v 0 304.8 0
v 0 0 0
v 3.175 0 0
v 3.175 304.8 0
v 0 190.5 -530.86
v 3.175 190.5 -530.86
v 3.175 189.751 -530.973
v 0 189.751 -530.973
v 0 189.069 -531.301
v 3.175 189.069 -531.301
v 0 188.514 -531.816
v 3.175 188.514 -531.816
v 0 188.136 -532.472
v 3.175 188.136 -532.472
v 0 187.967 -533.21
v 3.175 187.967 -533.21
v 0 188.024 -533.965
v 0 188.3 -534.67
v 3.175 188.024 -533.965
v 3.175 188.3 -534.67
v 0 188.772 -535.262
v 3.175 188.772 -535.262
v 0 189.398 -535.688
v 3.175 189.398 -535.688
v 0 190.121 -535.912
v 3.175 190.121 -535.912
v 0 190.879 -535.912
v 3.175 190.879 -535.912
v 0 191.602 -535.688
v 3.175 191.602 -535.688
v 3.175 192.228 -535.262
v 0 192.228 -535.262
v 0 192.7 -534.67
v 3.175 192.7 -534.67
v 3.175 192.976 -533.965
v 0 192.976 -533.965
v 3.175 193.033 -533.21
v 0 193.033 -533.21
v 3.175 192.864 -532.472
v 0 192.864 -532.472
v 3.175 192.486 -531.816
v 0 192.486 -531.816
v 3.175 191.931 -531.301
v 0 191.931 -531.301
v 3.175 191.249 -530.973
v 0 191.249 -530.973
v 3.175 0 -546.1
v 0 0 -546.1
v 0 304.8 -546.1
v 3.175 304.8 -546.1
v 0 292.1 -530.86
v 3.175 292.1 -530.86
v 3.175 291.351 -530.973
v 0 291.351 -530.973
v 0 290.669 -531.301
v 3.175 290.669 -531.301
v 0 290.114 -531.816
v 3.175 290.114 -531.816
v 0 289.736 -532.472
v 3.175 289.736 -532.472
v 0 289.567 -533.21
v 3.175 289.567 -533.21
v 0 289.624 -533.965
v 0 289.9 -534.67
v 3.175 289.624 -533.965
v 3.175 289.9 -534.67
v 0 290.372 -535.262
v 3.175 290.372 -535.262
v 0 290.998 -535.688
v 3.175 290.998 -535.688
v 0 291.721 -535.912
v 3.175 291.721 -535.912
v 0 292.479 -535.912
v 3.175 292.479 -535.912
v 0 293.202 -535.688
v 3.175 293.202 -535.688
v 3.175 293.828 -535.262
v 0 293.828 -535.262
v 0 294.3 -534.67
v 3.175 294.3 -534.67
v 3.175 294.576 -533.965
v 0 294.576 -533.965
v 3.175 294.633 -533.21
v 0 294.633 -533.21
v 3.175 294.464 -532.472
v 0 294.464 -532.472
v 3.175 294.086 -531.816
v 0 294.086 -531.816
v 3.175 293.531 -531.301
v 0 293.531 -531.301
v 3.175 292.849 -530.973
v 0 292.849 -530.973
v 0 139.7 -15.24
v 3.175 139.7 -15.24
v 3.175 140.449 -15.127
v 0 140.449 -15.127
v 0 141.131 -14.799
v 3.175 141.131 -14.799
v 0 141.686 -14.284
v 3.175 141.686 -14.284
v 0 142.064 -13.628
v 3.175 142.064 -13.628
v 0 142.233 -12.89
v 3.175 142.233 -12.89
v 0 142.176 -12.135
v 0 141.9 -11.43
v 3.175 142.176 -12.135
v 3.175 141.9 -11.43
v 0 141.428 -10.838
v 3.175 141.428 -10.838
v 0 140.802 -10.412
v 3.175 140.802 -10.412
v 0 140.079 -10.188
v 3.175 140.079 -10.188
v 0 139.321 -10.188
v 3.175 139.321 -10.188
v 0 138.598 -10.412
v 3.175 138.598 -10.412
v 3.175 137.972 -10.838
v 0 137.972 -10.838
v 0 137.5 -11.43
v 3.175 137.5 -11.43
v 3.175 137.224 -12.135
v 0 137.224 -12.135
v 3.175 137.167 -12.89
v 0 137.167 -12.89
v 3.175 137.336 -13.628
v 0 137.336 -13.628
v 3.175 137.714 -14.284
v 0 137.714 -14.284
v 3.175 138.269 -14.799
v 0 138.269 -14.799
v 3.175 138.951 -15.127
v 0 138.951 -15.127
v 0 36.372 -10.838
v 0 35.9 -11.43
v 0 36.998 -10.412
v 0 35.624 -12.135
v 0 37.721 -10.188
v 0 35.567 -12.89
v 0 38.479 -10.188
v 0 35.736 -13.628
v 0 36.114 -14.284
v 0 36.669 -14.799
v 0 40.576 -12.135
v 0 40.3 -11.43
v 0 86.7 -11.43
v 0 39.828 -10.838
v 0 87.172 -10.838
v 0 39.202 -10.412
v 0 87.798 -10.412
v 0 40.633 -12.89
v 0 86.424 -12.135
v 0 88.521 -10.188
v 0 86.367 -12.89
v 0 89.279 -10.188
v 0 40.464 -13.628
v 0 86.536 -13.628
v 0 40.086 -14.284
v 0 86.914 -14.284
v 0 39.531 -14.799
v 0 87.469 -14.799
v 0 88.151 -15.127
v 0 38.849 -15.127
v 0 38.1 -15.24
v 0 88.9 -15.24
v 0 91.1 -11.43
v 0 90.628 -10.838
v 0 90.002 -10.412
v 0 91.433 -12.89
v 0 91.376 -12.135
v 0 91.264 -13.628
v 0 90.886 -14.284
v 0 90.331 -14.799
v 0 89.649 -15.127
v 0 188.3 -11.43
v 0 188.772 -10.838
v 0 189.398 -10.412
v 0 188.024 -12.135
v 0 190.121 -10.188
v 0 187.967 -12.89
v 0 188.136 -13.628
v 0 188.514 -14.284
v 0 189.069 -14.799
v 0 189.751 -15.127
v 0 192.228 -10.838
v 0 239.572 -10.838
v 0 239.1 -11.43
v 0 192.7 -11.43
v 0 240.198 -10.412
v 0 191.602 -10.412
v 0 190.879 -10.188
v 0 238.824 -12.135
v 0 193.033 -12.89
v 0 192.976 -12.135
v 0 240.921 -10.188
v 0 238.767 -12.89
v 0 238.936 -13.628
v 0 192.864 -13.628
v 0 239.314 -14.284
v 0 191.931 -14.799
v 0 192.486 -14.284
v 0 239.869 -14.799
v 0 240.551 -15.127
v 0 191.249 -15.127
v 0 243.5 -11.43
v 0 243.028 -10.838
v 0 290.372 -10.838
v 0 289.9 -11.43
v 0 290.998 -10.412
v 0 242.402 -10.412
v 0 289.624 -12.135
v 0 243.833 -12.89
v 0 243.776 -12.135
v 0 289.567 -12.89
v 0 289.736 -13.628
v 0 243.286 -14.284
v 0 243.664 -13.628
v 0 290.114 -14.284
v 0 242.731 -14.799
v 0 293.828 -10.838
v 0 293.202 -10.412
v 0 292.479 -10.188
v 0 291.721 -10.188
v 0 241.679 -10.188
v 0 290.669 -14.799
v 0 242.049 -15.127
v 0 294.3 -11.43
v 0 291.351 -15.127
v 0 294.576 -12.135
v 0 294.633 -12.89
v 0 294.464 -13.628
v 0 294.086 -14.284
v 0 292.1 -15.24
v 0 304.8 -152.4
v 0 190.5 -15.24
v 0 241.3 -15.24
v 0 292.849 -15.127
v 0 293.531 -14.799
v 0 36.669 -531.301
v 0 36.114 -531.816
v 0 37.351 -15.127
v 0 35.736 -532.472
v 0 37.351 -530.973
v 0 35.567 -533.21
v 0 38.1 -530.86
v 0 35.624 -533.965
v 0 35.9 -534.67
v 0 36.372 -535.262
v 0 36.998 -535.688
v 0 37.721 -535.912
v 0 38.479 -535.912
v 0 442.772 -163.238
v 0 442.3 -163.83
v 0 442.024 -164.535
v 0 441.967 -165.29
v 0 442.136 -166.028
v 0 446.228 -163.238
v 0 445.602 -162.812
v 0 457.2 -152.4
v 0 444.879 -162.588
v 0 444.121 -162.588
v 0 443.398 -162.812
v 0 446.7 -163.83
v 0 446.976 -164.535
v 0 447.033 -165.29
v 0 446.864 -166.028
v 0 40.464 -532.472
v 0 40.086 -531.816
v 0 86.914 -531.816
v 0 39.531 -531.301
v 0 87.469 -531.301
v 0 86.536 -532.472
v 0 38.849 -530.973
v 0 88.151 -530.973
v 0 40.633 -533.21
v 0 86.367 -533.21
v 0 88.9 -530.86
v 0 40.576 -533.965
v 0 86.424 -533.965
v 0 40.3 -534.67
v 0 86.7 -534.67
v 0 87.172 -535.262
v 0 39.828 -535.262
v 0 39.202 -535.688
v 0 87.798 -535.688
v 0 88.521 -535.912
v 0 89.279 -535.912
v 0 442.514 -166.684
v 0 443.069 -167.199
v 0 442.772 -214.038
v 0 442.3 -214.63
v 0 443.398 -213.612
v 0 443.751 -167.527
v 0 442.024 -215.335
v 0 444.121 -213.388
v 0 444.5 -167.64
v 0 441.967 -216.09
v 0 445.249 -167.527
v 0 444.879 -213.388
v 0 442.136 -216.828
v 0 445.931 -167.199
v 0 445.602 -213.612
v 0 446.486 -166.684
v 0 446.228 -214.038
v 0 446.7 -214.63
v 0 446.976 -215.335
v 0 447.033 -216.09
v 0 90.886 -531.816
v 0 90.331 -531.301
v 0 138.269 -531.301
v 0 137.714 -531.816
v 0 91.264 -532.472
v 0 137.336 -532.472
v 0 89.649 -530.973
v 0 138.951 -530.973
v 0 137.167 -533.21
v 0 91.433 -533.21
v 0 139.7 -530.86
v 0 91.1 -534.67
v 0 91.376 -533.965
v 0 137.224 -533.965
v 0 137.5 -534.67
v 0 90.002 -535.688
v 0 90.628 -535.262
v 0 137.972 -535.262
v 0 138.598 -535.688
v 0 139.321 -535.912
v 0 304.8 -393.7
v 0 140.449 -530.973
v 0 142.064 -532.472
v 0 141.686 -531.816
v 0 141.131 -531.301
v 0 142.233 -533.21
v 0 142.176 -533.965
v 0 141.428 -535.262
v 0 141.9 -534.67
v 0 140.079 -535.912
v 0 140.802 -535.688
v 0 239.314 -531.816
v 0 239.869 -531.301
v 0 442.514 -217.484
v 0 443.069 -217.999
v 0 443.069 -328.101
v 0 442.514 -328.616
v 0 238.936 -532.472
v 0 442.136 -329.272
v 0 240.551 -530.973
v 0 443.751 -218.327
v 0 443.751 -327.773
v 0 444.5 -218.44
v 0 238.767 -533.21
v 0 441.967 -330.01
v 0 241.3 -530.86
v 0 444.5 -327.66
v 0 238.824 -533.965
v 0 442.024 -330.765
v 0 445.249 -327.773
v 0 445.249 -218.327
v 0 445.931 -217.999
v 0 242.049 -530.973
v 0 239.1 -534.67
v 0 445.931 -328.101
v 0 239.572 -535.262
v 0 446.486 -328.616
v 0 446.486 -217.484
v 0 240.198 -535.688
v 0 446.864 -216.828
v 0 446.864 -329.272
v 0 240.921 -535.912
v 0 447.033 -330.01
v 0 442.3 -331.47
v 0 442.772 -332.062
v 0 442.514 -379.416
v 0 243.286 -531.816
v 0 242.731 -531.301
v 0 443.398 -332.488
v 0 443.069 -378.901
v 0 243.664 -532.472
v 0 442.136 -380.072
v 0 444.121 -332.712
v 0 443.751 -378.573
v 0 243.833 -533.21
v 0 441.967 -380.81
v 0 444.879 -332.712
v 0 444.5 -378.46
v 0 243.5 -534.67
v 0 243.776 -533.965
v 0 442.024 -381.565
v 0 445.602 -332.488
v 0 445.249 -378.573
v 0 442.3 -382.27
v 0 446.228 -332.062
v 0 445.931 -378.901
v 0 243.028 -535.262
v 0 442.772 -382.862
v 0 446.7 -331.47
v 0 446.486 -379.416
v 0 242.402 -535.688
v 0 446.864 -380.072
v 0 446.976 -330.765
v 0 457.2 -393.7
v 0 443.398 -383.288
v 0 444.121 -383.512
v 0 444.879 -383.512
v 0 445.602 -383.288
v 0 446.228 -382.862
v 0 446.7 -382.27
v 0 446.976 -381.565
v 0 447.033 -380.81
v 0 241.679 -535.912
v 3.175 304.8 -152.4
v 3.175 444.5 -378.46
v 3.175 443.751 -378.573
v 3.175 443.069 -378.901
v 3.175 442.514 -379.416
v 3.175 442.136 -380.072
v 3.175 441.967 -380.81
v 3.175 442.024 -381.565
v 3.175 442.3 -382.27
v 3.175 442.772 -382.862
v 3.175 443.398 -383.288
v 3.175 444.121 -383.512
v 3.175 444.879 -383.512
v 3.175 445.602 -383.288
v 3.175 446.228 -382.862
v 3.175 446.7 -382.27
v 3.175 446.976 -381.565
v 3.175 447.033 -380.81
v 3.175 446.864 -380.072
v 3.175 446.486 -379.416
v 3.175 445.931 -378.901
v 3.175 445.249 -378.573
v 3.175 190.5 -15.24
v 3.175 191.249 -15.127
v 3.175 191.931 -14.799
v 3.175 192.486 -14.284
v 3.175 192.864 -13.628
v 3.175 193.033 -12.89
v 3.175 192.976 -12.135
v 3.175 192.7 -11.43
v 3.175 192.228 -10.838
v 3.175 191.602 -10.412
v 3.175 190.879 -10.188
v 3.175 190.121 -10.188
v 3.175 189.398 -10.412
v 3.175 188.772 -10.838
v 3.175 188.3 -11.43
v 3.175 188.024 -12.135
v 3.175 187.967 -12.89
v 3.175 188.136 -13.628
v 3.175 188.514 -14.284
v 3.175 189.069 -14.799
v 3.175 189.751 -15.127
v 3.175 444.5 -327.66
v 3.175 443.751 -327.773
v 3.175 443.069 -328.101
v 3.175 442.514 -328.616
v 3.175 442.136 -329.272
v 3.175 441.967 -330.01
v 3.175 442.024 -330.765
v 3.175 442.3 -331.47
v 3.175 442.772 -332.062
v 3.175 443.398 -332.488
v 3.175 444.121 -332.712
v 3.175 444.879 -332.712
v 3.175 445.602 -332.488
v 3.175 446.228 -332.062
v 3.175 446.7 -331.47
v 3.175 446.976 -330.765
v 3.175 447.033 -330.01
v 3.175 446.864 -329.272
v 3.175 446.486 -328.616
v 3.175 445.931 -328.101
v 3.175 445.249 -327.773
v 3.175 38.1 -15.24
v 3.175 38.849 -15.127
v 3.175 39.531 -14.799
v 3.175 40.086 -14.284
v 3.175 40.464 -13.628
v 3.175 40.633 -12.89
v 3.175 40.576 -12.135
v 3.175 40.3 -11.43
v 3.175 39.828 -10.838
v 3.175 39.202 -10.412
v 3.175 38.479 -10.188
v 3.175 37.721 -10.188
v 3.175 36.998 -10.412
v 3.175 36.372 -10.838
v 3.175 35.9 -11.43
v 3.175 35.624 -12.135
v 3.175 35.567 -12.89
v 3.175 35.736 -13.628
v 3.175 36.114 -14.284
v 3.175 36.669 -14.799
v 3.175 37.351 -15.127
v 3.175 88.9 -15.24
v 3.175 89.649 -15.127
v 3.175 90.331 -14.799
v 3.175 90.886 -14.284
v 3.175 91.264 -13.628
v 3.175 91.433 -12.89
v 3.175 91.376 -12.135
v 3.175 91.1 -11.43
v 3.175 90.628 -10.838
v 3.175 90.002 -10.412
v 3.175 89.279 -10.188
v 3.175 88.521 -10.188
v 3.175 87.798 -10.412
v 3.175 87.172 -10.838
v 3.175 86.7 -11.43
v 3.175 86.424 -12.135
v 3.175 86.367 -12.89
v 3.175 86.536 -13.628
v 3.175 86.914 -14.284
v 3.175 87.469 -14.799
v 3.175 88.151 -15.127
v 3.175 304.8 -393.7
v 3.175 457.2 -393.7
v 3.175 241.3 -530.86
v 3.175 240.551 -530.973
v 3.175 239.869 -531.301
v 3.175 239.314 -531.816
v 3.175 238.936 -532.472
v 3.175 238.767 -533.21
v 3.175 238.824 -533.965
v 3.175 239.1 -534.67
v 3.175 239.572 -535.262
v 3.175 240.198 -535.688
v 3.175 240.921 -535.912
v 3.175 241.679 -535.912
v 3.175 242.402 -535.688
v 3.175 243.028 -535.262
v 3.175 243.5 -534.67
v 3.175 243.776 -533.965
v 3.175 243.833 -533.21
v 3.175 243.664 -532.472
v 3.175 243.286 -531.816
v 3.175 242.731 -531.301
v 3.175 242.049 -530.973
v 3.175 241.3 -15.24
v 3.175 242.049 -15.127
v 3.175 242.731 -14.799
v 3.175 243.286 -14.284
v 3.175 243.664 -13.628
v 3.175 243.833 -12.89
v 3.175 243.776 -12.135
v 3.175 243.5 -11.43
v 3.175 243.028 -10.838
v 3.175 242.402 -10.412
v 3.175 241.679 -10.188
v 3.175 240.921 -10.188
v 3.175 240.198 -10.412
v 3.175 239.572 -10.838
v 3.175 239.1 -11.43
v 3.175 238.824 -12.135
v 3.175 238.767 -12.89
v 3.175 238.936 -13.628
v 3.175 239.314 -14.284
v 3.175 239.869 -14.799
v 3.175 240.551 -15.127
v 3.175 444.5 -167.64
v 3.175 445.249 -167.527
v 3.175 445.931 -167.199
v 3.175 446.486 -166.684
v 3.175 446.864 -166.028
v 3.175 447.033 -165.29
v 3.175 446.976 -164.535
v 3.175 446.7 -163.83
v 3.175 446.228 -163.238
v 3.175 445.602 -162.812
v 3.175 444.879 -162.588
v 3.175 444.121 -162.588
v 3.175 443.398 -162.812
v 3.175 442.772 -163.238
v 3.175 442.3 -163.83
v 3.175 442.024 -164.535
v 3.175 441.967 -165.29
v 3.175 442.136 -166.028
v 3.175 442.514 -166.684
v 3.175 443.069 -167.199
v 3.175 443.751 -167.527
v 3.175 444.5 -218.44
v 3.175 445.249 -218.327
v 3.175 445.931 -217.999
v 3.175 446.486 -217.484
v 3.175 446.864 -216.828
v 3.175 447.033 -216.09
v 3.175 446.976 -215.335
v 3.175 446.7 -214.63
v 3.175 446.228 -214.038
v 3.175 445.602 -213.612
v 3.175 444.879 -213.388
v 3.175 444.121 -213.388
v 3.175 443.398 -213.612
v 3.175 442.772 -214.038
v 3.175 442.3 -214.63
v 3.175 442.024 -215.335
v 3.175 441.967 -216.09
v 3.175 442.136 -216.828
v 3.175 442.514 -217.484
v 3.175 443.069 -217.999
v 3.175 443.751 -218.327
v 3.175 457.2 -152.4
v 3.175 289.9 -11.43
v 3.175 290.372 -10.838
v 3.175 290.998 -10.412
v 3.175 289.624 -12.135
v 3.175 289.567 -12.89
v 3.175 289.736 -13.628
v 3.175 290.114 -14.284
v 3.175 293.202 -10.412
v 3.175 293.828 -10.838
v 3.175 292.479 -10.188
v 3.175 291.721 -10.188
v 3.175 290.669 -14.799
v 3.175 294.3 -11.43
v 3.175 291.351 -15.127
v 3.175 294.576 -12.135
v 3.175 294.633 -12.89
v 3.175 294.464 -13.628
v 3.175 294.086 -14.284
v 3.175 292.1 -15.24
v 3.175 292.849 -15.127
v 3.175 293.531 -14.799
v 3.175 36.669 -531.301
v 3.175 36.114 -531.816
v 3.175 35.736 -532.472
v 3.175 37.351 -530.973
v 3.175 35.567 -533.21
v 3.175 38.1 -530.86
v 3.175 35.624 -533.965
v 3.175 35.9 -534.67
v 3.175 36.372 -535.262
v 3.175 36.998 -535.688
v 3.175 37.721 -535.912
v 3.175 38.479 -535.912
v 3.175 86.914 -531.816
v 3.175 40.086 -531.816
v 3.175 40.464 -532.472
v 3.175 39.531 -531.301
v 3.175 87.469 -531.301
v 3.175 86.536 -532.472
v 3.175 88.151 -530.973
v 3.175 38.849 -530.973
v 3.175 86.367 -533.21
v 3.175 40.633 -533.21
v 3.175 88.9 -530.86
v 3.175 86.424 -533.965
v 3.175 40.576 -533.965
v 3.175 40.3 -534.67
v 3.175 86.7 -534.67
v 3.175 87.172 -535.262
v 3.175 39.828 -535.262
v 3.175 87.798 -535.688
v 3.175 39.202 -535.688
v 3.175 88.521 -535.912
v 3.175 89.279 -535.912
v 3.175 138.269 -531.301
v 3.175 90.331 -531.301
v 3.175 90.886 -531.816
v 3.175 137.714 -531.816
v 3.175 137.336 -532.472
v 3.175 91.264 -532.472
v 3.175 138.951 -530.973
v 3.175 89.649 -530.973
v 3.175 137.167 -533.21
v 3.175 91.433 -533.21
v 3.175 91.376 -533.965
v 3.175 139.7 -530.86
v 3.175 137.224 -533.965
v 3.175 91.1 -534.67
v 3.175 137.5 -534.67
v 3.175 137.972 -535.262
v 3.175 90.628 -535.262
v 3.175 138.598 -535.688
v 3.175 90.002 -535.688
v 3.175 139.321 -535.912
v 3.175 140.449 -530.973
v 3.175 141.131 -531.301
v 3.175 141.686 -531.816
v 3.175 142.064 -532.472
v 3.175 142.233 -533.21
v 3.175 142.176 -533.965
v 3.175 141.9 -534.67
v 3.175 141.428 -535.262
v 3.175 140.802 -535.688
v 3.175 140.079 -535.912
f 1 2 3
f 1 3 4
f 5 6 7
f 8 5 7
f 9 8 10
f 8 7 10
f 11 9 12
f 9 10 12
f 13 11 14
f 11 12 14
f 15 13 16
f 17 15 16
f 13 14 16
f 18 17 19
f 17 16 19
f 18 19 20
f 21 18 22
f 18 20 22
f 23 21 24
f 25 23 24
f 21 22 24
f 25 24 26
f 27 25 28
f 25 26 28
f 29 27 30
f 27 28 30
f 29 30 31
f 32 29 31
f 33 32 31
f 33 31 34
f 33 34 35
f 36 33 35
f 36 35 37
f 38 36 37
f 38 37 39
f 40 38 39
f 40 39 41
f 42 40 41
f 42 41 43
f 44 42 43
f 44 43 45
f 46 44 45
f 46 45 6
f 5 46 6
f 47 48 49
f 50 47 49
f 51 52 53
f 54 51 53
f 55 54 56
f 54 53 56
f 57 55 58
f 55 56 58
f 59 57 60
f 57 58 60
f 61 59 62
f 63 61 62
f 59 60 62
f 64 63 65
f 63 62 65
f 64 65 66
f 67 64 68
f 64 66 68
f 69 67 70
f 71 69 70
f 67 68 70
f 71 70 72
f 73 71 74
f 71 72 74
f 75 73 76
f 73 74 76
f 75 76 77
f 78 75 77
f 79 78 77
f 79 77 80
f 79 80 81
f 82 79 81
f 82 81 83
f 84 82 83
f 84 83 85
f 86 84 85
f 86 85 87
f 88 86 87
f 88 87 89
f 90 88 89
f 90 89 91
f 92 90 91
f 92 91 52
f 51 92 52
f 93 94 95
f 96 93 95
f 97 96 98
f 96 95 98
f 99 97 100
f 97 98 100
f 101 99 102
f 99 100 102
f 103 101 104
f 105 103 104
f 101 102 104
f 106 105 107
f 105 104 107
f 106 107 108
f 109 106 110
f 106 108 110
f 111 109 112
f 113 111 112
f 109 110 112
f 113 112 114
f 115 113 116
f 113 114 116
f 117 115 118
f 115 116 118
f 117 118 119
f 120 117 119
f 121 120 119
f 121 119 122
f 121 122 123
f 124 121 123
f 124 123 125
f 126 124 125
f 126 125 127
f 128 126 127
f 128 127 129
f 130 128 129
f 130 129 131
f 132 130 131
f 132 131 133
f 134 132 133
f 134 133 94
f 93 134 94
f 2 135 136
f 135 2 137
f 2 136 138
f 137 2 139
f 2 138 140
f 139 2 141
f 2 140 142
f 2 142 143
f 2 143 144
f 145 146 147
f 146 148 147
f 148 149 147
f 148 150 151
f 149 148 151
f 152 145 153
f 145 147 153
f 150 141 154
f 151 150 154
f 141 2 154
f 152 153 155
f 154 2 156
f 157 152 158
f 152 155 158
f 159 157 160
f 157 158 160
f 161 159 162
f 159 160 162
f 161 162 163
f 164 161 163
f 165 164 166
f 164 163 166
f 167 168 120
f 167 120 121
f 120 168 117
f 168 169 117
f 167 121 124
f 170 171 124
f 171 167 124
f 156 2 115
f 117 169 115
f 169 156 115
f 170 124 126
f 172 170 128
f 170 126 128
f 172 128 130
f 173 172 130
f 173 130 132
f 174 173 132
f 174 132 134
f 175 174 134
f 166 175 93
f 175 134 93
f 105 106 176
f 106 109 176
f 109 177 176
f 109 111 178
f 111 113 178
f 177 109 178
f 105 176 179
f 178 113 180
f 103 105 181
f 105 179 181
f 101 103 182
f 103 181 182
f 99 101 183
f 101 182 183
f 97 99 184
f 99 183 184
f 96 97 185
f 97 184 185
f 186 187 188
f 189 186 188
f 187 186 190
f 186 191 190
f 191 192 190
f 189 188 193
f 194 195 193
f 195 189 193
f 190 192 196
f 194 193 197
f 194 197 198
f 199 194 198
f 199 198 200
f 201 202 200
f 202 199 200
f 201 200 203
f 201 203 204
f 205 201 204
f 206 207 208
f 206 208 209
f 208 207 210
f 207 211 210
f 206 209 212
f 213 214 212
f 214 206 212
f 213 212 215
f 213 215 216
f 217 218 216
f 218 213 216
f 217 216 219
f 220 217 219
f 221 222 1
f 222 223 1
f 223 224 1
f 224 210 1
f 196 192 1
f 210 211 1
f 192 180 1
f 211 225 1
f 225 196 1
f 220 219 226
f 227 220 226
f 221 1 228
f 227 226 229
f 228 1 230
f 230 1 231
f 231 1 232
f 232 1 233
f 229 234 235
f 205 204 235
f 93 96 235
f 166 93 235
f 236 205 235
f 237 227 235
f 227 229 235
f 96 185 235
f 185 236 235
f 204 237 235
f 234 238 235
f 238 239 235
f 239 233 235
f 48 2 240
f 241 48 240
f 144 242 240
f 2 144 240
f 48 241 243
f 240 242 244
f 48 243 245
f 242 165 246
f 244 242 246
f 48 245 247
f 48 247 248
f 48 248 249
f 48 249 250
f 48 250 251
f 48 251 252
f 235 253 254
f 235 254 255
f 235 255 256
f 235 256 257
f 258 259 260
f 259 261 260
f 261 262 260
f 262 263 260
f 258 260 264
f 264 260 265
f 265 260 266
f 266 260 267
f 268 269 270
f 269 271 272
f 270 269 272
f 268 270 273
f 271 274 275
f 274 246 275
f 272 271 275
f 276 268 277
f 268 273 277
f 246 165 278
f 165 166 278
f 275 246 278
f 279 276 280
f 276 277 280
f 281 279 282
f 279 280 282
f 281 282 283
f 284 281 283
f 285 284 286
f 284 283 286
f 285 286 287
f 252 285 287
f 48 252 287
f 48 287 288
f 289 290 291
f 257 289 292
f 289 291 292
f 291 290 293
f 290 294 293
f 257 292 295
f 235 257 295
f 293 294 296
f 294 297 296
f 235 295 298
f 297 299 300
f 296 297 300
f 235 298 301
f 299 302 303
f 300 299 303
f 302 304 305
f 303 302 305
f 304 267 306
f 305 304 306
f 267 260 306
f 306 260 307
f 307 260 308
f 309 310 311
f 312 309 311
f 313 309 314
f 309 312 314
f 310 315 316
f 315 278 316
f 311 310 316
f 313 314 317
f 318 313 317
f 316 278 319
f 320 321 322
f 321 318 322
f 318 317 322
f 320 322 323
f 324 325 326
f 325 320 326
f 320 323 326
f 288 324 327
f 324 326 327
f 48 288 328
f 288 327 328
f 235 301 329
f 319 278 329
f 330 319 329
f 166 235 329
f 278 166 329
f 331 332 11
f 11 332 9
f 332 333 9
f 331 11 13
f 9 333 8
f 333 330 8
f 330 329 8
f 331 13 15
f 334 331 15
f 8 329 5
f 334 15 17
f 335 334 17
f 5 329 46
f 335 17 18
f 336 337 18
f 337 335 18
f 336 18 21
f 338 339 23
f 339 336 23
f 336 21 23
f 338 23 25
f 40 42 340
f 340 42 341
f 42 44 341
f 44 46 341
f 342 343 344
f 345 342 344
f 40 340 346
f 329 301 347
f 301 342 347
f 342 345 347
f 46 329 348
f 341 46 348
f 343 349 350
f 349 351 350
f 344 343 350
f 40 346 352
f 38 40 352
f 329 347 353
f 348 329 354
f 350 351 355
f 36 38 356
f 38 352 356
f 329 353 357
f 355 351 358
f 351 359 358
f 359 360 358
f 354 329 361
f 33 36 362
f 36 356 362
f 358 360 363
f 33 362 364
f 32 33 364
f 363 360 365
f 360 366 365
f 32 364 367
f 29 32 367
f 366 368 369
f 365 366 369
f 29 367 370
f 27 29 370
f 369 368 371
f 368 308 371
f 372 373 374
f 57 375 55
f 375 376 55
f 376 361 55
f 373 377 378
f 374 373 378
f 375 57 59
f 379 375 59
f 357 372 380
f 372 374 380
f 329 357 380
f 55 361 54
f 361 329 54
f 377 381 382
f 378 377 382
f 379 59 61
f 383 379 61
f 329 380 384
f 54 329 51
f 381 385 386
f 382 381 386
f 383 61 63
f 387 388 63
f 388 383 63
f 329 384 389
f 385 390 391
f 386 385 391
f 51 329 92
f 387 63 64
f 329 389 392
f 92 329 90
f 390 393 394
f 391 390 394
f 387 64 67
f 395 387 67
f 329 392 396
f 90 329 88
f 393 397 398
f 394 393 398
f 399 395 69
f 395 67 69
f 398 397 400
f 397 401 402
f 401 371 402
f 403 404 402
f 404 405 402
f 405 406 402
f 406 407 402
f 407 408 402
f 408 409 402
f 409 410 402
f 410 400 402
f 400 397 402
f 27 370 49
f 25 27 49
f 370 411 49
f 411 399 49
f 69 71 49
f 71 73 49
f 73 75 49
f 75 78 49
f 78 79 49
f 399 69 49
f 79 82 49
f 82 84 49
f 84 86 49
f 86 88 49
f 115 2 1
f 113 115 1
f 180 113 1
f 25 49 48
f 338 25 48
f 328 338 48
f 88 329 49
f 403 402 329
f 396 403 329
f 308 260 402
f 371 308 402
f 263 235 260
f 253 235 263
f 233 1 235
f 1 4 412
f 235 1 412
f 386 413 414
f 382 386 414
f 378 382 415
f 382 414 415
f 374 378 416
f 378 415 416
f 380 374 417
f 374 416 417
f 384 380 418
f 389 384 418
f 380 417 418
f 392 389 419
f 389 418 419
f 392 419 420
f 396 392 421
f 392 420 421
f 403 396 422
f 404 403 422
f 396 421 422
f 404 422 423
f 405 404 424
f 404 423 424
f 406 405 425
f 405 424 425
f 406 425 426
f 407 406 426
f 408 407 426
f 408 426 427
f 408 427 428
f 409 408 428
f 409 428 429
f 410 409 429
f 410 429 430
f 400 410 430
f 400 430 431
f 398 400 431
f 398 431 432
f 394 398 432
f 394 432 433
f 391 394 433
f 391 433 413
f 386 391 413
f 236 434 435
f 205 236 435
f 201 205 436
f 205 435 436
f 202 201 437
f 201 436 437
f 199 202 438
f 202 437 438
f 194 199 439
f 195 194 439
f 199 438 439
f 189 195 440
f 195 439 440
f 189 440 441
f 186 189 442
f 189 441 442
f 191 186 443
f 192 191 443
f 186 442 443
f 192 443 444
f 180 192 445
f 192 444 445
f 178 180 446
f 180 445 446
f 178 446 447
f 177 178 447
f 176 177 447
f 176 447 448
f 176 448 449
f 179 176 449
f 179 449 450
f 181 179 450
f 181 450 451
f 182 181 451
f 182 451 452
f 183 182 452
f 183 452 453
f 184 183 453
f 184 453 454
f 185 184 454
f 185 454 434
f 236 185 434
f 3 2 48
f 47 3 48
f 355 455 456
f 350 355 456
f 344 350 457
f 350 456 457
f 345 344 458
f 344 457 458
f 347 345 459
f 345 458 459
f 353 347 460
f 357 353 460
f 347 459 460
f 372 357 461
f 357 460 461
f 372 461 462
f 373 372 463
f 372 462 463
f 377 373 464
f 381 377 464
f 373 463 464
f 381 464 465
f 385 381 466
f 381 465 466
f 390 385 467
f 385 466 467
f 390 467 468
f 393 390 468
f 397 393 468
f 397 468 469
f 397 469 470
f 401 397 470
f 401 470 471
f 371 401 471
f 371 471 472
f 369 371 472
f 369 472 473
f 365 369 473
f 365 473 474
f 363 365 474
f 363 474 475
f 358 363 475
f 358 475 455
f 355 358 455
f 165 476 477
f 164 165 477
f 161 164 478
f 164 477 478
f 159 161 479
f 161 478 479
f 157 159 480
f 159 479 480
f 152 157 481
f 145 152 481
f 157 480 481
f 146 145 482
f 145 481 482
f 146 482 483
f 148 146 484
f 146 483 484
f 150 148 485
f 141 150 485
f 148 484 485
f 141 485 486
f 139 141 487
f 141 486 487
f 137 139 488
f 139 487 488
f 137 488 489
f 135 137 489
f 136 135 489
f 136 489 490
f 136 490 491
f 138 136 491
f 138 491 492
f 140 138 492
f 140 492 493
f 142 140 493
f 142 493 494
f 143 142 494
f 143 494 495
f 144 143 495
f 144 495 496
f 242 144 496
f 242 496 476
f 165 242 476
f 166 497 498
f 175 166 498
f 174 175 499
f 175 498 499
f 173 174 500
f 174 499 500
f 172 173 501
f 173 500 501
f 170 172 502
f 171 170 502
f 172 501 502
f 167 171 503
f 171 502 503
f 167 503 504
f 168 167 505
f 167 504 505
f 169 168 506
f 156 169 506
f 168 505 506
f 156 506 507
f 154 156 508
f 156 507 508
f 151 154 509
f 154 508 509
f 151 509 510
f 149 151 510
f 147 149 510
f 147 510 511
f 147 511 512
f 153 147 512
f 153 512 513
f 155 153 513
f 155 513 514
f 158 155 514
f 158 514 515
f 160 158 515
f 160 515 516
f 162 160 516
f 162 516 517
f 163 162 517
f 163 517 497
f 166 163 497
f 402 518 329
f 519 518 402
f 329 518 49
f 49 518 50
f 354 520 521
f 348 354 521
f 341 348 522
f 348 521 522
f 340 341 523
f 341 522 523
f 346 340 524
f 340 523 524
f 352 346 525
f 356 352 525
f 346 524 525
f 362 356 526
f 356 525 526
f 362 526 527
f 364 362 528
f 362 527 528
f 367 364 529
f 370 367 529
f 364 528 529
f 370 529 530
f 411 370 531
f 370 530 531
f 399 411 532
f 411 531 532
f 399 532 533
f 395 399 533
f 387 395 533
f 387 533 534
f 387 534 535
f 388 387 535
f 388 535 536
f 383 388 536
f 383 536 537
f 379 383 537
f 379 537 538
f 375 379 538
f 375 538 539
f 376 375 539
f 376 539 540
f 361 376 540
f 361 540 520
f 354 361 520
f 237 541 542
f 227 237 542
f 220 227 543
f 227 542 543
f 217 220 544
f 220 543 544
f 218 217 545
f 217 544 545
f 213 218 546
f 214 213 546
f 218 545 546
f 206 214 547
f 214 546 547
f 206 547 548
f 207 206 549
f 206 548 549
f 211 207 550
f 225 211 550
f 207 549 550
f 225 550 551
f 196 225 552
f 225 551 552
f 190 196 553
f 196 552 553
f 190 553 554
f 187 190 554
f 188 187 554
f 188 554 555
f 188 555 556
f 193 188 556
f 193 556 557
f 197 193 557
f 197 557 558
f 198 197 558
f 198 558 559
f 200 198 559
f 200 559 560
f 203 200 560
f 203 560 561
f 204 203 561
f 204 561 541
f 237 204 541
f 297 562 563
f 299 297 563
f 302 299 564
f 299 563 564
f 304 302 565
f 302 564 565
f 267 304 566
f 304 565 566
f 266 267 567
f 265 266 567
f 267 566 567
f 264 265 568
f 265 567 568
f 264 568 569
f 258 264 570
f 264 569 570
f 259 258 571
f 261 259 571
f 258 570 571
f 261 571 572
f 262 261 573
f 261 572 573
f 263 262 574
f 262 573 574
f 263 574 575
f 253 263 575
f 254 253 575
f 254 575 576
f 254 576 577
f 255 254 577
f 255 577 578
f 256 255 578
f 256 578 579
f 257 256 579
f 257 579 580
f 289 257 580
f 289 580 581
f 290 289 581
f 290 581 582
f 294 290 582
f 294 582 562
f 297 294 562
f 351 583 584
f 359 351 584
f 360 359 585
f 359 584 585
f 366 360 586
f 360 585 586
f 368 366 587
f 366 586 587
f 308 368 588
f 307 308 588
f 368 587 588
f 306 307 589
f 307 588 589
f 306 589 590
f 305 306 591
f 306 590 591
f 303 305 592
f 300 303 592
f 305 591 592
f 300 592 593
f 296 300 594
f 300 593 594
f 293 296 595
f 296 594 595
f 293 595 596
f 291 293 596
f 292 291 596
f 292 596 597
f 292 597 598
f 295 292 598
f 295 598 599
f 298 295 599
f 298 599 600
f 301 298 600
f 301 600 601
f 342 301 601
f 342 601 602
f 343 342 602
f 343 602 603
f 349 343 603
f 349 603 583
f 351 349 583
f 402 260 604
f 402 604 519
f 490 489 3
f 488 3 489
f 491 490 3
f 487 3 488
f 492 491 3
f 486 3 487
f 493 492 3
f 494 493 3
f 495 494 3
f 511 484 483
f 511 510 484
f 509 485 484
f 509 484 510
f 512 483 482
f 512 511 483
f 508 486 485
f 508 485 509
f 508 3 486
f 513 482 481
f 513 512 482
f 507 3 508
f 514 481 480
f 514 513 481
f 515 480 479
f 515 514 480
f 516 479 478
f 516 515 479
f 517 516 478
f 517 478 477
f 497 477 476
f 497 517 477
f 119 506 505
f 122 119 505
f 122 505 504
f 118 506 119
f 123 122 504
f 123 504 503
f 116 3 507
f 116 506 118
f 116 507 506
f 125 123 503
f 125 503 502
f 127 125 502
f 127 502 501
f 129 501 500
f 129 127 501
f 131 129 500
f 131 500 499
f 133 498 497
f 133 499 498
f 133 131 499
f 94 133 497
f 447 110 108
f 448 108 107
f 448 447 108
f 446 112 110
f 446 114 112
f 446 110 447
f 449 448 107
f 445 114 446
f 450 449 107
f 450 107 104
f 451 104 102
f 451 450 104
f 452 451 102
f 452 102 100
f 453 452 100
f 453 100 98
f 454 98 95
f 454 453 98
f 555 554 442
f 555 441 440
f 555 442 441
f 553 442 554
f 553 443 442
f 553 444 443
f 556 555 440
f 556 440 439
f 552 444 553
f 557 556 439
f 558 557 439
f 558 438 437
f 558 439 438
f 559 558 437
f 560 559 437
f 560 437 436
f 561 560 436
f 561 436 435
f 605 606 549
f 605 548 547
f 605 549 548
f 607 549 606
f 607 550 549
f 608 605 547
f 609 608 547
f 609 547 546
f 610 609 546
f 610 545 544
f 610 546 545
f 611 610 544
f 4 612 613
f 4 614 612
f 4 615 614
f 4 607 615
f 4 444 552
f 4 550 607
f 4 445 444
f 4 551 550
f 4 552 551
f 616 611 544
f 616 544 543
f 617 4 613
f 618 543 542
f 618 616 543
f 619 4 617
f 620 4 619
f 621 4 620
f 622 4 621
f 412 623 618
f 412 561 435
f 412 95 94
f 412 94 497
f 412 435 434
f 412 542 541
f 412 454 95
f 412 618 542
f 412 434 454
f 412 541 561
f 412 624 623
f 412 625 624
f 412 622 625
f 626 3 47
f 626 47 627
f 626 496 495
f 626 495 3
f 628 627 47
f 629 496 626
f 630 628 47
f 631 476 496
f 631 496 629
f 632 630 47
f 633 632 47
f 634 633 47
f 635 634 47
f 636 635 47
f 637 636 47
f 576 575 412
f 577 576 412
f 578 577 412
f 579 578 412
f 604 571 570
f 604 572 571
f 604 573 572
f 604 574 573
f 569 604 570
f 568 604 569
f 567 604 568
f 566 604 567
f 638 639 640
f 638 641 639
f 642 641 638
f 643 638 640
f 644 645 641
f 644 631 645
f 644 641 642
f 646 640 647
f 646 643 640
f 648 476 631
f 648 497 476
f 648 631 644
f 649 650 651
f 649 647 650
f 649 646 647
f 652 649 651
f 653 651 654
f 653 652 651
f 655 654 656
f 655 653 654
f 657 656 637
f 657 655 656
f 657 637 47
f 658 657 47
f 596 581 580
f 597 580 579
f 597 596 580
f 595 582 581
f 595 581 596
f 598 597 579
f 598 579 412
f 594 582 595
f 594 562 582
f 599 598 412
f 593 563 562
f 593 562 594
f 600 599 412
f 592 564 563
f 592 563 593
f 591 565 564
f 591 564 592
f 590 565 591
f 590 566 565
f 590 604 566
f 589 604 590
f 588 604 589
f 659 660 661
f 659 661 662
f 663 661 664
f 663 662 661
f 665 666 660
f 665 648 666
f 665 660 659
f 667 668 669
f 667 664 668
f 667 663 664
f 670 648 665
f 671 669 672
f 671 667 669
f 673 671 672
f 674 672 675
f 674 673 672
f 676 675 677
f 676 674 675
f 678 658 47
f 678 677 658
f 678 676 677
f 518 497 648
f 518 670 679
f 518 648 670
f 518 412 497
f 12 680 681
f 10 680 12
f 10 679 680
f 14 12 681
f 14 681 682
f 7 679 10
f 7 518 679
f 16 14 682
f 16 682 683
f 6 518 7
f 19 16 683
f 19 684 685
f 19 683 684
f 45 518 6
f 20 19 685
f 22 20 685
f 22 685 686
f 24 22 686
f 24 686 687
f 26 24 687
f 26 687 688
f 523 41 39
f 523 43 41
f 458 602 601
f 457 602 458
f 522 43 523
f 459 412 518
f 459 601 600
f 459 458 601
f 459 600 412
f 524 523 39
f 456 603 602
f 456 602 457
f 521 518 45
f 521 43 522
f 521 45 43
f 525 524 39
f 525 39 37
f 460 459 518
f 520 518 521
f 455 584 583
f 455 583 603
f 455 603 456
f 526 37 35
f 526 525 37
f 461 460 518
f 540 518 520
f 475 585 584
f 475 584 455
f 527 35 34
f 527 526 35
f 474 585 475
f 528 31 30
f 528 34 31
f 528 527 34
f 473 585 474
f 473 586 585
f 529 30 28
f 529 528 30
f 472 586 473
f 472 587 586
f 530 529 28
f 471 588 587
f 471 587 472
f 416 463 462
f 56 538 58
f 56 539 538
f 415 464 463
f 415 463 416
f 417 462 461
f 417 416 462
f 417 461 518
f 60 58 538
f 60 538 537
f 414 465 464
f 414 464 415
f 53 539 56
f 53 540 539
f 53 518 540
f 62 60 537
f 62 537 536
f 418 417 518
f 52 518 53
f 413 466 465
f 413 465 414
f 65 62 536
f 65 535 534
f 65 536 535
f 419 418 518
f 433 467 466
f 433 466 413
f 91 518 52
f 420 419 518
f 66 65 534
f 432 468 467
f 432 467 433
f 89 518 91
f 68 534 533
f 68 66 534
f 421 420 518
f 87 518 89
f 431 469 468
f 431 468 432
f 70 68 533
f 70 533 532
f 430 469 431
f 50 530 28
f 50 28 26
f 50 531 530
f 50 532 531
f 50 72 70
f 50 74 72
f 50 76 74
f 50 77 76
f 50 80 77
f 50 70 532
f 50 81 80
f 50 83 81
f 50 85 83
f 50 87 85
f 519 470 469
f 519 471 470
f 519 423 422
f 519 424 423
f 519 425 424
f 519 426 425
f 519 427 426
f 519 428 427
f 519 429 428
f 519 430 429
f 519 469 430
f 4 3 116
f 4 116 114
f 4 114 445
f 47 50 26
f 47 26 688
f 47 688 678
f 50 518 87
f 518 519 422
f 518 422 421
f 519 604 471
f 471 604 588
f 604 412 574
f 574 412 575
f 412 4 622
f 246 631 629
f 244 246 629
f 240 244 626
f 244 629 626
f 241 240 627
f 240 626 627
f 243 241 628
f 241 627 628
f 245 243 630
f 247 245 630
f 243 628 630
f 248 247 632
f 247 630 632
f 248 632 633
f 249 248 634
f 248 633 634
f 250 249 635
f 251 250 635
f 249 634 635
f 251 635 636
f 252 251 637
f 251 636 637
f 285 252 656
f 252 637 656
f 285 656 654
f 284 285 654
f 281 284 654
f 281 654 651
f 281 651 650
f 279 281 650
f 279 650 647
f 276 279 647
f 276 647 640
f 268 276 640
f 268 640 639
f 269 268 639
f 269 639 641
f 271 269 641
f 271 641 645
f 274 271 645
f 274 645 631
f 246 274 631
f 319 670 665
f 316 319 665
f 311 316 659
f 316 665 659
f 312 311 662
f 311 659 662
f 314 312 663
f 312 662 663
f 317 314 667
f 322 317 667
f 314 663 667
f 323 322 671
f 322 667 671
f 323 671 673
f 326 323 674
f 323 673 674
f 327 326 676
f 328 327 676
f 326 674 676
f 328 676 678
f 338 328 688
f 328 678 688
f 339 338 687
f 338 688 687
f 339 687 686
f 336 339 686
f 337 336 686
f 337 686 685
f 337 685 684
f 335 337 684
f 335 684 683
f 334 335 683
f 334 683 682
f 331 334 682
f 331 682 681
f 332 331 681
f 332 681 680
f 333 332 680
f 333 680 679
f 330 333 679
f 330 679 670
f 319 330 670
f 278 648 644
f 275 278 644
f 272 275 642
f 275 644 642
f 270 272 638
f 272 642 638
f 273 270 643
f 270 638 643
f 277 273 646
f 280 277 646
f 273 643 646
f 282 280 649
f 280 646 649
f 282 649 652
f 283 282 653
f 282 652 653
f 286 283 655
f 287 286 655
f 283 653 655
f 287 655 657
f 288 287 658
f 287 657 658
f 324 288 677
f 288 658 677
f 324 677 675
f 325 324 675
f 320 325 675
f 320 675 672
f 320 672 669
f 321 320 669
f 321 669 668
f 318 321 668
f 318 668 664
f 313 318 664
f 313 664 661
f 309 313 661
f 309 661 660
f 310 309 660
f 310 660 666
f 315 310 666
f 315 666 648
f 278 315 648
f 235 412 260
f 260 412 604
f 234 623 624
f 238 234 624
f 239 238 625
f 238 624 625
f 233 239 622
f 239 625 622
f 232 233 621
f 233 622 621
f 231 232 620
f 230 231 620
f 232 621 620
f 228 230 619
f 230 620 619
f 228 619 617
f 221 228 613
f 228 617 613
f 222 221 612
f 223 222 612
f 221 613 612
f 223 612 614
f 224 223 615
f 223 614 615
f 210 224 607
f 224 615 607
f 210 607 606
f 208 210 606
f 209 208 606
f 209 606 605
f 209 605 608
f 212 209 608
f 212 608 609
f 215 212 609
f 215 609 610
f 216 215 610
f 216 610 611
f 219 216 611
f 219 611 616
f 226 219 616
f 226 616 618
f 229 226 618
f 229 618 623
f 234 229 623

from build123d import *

# Parameters (mm, degrees)
SKETCH1_W           = 546.1
SKETCH1_H           = 457.2
BOSS_EXTRUDE1_DEPTH = 3.175
SKETCH2_R           = 2.54
CUT_EXTRUDE1_DEPTH  = 713.226881425
SKETCH4_W           = 152.4
SKETCH4_H           = 152.4
CUT_EXTRUDE2_DEPTH  = 713.226881425


with BuildPart() as part:
    # Sketch1 → Boss-Extrude1 (new body)
    with BuildSketch(Plane(origin=(0, 0, 0), x_dir=(0, 0, -1), z_dir=(1, 0, 0))):
        with Locations((273.05, 228.6)):
            Rectangle(SKETCH1_W, SKETCH1_H)
    extrude(amount=BOSS_EXTRUDE1_DEPTH)

    # Sketch2 → Cut-Extrude1 (cut, through all)
    with BuildSketch(Plane(origin=(3.175, 0, 0), x_dir=(0, 0, -1), z_dir=(1, 0, 0))):
        with Locations((12.7, 444.5)):
            Circle(SKETCH2_R)
        with Locations((63.5, 444.5)):
            Circle(SKETCH2_R)
        with Locations((114.3, 444.5)):
            Circle(SKETCH2_R)
        with Locations((165.1, 444.5)):
            Circle(SKETCH2_R)
        with Locations((215.9, 444.5)):
            Circle(SKETCH2_R)
        with Locations((12.7, 393.7)):
            Circle(SKETCH2_R)
        with Locations((12.7, 342.9)):
            Circle(SKETCH2_R)
        with Locations((12.7, 292.1)):
            Circle(SKETCH2_R)
        with Locations((12.7, 241.3)):
            Circle(SKETCH2_R)
        with Locations((12.7, 190.5)):
            Circle(SKETCH2_R)
        with Locations((12.7, 139.7)):
            Circle(SKETCH2_R)
        with Locations((12.7, 88.9)):
            Circle(SKETCH2_R)
        with Locations((12.7, 38.1)):
            Circle(SKETCH2_R)
        with Locations(Location((533.4, 38.1, 0), (0, 0, 180))):
            Circle(SKETCH2_R)
        with Locations(Location((533.4, 88.9, 0), (0, 0, 180))):
            Circle(SKETCH2_R)
        with Locations(Location((533.4, 139.7, 0), (0, 0, 180))):
            Circle(SKETCH2_R)
        with Locations(Location((533.4, 190.5, 0), (0, 0, 180))):
            Circle(SKETCH2_R)
        with Locations(Location((533.4, 241.3, 0), (0, 0, 180))):
            Circle(SKETCH2_R)
        with Locations(Location((533.4, 292.1, 0), (0, 0, 180))):
            Circle(SKETCH2_R)
        with Locations(Location((533.4, 342.9, 0), (0, 0, 180))):
            Circle(SKETCH2_R)
        with Locations(Location((533.4, 393.7, 0), (0, 0, 180))):
            Circle(SKETCH2_R)
        with Locations(Location((330.2, 444.5, 0), (0, 0, 180))):
            Circle(SKETCH2_R)
        with Locations(Location((381, 444.5, 0), (0, 0, 180))):
            Circle(SKETCH2_R)
        with Locations(Location((431.8, 444.5, 0), (0, 0, 180))):
            Circle(SKETCH2_R)
        with Locations(Location((482.6, 444.5, 0), (0, 0, 180))):
            Circle(SKETCH2_R)
        with Locations(Location((533.4, 444.5, 0), (0, 0, 180))):
            Circle(SKETCH2_R)
    extrude(amount=-CUT_EXTRUDE1_DEPTH, mode=Mode.SUBTRACT)

    # Sketch4 → Cut-Extrude2 (cut, through all)
    with BuildSketch(Plane(origin=(3.175, 0, 0), x_dir=(0, 0, -1), z_dir=(1, 0, 0))):
        with Locations((76.2, 381)):
            Rectangle(SKETCH4_W, SKETCH4_H)
        with Locations((469.9, 381)):
            Rectangle(SKETCH4_W, SKETCH4_H)
    extrude(amount=-CUT_EXTRUDE2_DEPTH, mode=Mode.SUBTRACT)


solid = part.part
